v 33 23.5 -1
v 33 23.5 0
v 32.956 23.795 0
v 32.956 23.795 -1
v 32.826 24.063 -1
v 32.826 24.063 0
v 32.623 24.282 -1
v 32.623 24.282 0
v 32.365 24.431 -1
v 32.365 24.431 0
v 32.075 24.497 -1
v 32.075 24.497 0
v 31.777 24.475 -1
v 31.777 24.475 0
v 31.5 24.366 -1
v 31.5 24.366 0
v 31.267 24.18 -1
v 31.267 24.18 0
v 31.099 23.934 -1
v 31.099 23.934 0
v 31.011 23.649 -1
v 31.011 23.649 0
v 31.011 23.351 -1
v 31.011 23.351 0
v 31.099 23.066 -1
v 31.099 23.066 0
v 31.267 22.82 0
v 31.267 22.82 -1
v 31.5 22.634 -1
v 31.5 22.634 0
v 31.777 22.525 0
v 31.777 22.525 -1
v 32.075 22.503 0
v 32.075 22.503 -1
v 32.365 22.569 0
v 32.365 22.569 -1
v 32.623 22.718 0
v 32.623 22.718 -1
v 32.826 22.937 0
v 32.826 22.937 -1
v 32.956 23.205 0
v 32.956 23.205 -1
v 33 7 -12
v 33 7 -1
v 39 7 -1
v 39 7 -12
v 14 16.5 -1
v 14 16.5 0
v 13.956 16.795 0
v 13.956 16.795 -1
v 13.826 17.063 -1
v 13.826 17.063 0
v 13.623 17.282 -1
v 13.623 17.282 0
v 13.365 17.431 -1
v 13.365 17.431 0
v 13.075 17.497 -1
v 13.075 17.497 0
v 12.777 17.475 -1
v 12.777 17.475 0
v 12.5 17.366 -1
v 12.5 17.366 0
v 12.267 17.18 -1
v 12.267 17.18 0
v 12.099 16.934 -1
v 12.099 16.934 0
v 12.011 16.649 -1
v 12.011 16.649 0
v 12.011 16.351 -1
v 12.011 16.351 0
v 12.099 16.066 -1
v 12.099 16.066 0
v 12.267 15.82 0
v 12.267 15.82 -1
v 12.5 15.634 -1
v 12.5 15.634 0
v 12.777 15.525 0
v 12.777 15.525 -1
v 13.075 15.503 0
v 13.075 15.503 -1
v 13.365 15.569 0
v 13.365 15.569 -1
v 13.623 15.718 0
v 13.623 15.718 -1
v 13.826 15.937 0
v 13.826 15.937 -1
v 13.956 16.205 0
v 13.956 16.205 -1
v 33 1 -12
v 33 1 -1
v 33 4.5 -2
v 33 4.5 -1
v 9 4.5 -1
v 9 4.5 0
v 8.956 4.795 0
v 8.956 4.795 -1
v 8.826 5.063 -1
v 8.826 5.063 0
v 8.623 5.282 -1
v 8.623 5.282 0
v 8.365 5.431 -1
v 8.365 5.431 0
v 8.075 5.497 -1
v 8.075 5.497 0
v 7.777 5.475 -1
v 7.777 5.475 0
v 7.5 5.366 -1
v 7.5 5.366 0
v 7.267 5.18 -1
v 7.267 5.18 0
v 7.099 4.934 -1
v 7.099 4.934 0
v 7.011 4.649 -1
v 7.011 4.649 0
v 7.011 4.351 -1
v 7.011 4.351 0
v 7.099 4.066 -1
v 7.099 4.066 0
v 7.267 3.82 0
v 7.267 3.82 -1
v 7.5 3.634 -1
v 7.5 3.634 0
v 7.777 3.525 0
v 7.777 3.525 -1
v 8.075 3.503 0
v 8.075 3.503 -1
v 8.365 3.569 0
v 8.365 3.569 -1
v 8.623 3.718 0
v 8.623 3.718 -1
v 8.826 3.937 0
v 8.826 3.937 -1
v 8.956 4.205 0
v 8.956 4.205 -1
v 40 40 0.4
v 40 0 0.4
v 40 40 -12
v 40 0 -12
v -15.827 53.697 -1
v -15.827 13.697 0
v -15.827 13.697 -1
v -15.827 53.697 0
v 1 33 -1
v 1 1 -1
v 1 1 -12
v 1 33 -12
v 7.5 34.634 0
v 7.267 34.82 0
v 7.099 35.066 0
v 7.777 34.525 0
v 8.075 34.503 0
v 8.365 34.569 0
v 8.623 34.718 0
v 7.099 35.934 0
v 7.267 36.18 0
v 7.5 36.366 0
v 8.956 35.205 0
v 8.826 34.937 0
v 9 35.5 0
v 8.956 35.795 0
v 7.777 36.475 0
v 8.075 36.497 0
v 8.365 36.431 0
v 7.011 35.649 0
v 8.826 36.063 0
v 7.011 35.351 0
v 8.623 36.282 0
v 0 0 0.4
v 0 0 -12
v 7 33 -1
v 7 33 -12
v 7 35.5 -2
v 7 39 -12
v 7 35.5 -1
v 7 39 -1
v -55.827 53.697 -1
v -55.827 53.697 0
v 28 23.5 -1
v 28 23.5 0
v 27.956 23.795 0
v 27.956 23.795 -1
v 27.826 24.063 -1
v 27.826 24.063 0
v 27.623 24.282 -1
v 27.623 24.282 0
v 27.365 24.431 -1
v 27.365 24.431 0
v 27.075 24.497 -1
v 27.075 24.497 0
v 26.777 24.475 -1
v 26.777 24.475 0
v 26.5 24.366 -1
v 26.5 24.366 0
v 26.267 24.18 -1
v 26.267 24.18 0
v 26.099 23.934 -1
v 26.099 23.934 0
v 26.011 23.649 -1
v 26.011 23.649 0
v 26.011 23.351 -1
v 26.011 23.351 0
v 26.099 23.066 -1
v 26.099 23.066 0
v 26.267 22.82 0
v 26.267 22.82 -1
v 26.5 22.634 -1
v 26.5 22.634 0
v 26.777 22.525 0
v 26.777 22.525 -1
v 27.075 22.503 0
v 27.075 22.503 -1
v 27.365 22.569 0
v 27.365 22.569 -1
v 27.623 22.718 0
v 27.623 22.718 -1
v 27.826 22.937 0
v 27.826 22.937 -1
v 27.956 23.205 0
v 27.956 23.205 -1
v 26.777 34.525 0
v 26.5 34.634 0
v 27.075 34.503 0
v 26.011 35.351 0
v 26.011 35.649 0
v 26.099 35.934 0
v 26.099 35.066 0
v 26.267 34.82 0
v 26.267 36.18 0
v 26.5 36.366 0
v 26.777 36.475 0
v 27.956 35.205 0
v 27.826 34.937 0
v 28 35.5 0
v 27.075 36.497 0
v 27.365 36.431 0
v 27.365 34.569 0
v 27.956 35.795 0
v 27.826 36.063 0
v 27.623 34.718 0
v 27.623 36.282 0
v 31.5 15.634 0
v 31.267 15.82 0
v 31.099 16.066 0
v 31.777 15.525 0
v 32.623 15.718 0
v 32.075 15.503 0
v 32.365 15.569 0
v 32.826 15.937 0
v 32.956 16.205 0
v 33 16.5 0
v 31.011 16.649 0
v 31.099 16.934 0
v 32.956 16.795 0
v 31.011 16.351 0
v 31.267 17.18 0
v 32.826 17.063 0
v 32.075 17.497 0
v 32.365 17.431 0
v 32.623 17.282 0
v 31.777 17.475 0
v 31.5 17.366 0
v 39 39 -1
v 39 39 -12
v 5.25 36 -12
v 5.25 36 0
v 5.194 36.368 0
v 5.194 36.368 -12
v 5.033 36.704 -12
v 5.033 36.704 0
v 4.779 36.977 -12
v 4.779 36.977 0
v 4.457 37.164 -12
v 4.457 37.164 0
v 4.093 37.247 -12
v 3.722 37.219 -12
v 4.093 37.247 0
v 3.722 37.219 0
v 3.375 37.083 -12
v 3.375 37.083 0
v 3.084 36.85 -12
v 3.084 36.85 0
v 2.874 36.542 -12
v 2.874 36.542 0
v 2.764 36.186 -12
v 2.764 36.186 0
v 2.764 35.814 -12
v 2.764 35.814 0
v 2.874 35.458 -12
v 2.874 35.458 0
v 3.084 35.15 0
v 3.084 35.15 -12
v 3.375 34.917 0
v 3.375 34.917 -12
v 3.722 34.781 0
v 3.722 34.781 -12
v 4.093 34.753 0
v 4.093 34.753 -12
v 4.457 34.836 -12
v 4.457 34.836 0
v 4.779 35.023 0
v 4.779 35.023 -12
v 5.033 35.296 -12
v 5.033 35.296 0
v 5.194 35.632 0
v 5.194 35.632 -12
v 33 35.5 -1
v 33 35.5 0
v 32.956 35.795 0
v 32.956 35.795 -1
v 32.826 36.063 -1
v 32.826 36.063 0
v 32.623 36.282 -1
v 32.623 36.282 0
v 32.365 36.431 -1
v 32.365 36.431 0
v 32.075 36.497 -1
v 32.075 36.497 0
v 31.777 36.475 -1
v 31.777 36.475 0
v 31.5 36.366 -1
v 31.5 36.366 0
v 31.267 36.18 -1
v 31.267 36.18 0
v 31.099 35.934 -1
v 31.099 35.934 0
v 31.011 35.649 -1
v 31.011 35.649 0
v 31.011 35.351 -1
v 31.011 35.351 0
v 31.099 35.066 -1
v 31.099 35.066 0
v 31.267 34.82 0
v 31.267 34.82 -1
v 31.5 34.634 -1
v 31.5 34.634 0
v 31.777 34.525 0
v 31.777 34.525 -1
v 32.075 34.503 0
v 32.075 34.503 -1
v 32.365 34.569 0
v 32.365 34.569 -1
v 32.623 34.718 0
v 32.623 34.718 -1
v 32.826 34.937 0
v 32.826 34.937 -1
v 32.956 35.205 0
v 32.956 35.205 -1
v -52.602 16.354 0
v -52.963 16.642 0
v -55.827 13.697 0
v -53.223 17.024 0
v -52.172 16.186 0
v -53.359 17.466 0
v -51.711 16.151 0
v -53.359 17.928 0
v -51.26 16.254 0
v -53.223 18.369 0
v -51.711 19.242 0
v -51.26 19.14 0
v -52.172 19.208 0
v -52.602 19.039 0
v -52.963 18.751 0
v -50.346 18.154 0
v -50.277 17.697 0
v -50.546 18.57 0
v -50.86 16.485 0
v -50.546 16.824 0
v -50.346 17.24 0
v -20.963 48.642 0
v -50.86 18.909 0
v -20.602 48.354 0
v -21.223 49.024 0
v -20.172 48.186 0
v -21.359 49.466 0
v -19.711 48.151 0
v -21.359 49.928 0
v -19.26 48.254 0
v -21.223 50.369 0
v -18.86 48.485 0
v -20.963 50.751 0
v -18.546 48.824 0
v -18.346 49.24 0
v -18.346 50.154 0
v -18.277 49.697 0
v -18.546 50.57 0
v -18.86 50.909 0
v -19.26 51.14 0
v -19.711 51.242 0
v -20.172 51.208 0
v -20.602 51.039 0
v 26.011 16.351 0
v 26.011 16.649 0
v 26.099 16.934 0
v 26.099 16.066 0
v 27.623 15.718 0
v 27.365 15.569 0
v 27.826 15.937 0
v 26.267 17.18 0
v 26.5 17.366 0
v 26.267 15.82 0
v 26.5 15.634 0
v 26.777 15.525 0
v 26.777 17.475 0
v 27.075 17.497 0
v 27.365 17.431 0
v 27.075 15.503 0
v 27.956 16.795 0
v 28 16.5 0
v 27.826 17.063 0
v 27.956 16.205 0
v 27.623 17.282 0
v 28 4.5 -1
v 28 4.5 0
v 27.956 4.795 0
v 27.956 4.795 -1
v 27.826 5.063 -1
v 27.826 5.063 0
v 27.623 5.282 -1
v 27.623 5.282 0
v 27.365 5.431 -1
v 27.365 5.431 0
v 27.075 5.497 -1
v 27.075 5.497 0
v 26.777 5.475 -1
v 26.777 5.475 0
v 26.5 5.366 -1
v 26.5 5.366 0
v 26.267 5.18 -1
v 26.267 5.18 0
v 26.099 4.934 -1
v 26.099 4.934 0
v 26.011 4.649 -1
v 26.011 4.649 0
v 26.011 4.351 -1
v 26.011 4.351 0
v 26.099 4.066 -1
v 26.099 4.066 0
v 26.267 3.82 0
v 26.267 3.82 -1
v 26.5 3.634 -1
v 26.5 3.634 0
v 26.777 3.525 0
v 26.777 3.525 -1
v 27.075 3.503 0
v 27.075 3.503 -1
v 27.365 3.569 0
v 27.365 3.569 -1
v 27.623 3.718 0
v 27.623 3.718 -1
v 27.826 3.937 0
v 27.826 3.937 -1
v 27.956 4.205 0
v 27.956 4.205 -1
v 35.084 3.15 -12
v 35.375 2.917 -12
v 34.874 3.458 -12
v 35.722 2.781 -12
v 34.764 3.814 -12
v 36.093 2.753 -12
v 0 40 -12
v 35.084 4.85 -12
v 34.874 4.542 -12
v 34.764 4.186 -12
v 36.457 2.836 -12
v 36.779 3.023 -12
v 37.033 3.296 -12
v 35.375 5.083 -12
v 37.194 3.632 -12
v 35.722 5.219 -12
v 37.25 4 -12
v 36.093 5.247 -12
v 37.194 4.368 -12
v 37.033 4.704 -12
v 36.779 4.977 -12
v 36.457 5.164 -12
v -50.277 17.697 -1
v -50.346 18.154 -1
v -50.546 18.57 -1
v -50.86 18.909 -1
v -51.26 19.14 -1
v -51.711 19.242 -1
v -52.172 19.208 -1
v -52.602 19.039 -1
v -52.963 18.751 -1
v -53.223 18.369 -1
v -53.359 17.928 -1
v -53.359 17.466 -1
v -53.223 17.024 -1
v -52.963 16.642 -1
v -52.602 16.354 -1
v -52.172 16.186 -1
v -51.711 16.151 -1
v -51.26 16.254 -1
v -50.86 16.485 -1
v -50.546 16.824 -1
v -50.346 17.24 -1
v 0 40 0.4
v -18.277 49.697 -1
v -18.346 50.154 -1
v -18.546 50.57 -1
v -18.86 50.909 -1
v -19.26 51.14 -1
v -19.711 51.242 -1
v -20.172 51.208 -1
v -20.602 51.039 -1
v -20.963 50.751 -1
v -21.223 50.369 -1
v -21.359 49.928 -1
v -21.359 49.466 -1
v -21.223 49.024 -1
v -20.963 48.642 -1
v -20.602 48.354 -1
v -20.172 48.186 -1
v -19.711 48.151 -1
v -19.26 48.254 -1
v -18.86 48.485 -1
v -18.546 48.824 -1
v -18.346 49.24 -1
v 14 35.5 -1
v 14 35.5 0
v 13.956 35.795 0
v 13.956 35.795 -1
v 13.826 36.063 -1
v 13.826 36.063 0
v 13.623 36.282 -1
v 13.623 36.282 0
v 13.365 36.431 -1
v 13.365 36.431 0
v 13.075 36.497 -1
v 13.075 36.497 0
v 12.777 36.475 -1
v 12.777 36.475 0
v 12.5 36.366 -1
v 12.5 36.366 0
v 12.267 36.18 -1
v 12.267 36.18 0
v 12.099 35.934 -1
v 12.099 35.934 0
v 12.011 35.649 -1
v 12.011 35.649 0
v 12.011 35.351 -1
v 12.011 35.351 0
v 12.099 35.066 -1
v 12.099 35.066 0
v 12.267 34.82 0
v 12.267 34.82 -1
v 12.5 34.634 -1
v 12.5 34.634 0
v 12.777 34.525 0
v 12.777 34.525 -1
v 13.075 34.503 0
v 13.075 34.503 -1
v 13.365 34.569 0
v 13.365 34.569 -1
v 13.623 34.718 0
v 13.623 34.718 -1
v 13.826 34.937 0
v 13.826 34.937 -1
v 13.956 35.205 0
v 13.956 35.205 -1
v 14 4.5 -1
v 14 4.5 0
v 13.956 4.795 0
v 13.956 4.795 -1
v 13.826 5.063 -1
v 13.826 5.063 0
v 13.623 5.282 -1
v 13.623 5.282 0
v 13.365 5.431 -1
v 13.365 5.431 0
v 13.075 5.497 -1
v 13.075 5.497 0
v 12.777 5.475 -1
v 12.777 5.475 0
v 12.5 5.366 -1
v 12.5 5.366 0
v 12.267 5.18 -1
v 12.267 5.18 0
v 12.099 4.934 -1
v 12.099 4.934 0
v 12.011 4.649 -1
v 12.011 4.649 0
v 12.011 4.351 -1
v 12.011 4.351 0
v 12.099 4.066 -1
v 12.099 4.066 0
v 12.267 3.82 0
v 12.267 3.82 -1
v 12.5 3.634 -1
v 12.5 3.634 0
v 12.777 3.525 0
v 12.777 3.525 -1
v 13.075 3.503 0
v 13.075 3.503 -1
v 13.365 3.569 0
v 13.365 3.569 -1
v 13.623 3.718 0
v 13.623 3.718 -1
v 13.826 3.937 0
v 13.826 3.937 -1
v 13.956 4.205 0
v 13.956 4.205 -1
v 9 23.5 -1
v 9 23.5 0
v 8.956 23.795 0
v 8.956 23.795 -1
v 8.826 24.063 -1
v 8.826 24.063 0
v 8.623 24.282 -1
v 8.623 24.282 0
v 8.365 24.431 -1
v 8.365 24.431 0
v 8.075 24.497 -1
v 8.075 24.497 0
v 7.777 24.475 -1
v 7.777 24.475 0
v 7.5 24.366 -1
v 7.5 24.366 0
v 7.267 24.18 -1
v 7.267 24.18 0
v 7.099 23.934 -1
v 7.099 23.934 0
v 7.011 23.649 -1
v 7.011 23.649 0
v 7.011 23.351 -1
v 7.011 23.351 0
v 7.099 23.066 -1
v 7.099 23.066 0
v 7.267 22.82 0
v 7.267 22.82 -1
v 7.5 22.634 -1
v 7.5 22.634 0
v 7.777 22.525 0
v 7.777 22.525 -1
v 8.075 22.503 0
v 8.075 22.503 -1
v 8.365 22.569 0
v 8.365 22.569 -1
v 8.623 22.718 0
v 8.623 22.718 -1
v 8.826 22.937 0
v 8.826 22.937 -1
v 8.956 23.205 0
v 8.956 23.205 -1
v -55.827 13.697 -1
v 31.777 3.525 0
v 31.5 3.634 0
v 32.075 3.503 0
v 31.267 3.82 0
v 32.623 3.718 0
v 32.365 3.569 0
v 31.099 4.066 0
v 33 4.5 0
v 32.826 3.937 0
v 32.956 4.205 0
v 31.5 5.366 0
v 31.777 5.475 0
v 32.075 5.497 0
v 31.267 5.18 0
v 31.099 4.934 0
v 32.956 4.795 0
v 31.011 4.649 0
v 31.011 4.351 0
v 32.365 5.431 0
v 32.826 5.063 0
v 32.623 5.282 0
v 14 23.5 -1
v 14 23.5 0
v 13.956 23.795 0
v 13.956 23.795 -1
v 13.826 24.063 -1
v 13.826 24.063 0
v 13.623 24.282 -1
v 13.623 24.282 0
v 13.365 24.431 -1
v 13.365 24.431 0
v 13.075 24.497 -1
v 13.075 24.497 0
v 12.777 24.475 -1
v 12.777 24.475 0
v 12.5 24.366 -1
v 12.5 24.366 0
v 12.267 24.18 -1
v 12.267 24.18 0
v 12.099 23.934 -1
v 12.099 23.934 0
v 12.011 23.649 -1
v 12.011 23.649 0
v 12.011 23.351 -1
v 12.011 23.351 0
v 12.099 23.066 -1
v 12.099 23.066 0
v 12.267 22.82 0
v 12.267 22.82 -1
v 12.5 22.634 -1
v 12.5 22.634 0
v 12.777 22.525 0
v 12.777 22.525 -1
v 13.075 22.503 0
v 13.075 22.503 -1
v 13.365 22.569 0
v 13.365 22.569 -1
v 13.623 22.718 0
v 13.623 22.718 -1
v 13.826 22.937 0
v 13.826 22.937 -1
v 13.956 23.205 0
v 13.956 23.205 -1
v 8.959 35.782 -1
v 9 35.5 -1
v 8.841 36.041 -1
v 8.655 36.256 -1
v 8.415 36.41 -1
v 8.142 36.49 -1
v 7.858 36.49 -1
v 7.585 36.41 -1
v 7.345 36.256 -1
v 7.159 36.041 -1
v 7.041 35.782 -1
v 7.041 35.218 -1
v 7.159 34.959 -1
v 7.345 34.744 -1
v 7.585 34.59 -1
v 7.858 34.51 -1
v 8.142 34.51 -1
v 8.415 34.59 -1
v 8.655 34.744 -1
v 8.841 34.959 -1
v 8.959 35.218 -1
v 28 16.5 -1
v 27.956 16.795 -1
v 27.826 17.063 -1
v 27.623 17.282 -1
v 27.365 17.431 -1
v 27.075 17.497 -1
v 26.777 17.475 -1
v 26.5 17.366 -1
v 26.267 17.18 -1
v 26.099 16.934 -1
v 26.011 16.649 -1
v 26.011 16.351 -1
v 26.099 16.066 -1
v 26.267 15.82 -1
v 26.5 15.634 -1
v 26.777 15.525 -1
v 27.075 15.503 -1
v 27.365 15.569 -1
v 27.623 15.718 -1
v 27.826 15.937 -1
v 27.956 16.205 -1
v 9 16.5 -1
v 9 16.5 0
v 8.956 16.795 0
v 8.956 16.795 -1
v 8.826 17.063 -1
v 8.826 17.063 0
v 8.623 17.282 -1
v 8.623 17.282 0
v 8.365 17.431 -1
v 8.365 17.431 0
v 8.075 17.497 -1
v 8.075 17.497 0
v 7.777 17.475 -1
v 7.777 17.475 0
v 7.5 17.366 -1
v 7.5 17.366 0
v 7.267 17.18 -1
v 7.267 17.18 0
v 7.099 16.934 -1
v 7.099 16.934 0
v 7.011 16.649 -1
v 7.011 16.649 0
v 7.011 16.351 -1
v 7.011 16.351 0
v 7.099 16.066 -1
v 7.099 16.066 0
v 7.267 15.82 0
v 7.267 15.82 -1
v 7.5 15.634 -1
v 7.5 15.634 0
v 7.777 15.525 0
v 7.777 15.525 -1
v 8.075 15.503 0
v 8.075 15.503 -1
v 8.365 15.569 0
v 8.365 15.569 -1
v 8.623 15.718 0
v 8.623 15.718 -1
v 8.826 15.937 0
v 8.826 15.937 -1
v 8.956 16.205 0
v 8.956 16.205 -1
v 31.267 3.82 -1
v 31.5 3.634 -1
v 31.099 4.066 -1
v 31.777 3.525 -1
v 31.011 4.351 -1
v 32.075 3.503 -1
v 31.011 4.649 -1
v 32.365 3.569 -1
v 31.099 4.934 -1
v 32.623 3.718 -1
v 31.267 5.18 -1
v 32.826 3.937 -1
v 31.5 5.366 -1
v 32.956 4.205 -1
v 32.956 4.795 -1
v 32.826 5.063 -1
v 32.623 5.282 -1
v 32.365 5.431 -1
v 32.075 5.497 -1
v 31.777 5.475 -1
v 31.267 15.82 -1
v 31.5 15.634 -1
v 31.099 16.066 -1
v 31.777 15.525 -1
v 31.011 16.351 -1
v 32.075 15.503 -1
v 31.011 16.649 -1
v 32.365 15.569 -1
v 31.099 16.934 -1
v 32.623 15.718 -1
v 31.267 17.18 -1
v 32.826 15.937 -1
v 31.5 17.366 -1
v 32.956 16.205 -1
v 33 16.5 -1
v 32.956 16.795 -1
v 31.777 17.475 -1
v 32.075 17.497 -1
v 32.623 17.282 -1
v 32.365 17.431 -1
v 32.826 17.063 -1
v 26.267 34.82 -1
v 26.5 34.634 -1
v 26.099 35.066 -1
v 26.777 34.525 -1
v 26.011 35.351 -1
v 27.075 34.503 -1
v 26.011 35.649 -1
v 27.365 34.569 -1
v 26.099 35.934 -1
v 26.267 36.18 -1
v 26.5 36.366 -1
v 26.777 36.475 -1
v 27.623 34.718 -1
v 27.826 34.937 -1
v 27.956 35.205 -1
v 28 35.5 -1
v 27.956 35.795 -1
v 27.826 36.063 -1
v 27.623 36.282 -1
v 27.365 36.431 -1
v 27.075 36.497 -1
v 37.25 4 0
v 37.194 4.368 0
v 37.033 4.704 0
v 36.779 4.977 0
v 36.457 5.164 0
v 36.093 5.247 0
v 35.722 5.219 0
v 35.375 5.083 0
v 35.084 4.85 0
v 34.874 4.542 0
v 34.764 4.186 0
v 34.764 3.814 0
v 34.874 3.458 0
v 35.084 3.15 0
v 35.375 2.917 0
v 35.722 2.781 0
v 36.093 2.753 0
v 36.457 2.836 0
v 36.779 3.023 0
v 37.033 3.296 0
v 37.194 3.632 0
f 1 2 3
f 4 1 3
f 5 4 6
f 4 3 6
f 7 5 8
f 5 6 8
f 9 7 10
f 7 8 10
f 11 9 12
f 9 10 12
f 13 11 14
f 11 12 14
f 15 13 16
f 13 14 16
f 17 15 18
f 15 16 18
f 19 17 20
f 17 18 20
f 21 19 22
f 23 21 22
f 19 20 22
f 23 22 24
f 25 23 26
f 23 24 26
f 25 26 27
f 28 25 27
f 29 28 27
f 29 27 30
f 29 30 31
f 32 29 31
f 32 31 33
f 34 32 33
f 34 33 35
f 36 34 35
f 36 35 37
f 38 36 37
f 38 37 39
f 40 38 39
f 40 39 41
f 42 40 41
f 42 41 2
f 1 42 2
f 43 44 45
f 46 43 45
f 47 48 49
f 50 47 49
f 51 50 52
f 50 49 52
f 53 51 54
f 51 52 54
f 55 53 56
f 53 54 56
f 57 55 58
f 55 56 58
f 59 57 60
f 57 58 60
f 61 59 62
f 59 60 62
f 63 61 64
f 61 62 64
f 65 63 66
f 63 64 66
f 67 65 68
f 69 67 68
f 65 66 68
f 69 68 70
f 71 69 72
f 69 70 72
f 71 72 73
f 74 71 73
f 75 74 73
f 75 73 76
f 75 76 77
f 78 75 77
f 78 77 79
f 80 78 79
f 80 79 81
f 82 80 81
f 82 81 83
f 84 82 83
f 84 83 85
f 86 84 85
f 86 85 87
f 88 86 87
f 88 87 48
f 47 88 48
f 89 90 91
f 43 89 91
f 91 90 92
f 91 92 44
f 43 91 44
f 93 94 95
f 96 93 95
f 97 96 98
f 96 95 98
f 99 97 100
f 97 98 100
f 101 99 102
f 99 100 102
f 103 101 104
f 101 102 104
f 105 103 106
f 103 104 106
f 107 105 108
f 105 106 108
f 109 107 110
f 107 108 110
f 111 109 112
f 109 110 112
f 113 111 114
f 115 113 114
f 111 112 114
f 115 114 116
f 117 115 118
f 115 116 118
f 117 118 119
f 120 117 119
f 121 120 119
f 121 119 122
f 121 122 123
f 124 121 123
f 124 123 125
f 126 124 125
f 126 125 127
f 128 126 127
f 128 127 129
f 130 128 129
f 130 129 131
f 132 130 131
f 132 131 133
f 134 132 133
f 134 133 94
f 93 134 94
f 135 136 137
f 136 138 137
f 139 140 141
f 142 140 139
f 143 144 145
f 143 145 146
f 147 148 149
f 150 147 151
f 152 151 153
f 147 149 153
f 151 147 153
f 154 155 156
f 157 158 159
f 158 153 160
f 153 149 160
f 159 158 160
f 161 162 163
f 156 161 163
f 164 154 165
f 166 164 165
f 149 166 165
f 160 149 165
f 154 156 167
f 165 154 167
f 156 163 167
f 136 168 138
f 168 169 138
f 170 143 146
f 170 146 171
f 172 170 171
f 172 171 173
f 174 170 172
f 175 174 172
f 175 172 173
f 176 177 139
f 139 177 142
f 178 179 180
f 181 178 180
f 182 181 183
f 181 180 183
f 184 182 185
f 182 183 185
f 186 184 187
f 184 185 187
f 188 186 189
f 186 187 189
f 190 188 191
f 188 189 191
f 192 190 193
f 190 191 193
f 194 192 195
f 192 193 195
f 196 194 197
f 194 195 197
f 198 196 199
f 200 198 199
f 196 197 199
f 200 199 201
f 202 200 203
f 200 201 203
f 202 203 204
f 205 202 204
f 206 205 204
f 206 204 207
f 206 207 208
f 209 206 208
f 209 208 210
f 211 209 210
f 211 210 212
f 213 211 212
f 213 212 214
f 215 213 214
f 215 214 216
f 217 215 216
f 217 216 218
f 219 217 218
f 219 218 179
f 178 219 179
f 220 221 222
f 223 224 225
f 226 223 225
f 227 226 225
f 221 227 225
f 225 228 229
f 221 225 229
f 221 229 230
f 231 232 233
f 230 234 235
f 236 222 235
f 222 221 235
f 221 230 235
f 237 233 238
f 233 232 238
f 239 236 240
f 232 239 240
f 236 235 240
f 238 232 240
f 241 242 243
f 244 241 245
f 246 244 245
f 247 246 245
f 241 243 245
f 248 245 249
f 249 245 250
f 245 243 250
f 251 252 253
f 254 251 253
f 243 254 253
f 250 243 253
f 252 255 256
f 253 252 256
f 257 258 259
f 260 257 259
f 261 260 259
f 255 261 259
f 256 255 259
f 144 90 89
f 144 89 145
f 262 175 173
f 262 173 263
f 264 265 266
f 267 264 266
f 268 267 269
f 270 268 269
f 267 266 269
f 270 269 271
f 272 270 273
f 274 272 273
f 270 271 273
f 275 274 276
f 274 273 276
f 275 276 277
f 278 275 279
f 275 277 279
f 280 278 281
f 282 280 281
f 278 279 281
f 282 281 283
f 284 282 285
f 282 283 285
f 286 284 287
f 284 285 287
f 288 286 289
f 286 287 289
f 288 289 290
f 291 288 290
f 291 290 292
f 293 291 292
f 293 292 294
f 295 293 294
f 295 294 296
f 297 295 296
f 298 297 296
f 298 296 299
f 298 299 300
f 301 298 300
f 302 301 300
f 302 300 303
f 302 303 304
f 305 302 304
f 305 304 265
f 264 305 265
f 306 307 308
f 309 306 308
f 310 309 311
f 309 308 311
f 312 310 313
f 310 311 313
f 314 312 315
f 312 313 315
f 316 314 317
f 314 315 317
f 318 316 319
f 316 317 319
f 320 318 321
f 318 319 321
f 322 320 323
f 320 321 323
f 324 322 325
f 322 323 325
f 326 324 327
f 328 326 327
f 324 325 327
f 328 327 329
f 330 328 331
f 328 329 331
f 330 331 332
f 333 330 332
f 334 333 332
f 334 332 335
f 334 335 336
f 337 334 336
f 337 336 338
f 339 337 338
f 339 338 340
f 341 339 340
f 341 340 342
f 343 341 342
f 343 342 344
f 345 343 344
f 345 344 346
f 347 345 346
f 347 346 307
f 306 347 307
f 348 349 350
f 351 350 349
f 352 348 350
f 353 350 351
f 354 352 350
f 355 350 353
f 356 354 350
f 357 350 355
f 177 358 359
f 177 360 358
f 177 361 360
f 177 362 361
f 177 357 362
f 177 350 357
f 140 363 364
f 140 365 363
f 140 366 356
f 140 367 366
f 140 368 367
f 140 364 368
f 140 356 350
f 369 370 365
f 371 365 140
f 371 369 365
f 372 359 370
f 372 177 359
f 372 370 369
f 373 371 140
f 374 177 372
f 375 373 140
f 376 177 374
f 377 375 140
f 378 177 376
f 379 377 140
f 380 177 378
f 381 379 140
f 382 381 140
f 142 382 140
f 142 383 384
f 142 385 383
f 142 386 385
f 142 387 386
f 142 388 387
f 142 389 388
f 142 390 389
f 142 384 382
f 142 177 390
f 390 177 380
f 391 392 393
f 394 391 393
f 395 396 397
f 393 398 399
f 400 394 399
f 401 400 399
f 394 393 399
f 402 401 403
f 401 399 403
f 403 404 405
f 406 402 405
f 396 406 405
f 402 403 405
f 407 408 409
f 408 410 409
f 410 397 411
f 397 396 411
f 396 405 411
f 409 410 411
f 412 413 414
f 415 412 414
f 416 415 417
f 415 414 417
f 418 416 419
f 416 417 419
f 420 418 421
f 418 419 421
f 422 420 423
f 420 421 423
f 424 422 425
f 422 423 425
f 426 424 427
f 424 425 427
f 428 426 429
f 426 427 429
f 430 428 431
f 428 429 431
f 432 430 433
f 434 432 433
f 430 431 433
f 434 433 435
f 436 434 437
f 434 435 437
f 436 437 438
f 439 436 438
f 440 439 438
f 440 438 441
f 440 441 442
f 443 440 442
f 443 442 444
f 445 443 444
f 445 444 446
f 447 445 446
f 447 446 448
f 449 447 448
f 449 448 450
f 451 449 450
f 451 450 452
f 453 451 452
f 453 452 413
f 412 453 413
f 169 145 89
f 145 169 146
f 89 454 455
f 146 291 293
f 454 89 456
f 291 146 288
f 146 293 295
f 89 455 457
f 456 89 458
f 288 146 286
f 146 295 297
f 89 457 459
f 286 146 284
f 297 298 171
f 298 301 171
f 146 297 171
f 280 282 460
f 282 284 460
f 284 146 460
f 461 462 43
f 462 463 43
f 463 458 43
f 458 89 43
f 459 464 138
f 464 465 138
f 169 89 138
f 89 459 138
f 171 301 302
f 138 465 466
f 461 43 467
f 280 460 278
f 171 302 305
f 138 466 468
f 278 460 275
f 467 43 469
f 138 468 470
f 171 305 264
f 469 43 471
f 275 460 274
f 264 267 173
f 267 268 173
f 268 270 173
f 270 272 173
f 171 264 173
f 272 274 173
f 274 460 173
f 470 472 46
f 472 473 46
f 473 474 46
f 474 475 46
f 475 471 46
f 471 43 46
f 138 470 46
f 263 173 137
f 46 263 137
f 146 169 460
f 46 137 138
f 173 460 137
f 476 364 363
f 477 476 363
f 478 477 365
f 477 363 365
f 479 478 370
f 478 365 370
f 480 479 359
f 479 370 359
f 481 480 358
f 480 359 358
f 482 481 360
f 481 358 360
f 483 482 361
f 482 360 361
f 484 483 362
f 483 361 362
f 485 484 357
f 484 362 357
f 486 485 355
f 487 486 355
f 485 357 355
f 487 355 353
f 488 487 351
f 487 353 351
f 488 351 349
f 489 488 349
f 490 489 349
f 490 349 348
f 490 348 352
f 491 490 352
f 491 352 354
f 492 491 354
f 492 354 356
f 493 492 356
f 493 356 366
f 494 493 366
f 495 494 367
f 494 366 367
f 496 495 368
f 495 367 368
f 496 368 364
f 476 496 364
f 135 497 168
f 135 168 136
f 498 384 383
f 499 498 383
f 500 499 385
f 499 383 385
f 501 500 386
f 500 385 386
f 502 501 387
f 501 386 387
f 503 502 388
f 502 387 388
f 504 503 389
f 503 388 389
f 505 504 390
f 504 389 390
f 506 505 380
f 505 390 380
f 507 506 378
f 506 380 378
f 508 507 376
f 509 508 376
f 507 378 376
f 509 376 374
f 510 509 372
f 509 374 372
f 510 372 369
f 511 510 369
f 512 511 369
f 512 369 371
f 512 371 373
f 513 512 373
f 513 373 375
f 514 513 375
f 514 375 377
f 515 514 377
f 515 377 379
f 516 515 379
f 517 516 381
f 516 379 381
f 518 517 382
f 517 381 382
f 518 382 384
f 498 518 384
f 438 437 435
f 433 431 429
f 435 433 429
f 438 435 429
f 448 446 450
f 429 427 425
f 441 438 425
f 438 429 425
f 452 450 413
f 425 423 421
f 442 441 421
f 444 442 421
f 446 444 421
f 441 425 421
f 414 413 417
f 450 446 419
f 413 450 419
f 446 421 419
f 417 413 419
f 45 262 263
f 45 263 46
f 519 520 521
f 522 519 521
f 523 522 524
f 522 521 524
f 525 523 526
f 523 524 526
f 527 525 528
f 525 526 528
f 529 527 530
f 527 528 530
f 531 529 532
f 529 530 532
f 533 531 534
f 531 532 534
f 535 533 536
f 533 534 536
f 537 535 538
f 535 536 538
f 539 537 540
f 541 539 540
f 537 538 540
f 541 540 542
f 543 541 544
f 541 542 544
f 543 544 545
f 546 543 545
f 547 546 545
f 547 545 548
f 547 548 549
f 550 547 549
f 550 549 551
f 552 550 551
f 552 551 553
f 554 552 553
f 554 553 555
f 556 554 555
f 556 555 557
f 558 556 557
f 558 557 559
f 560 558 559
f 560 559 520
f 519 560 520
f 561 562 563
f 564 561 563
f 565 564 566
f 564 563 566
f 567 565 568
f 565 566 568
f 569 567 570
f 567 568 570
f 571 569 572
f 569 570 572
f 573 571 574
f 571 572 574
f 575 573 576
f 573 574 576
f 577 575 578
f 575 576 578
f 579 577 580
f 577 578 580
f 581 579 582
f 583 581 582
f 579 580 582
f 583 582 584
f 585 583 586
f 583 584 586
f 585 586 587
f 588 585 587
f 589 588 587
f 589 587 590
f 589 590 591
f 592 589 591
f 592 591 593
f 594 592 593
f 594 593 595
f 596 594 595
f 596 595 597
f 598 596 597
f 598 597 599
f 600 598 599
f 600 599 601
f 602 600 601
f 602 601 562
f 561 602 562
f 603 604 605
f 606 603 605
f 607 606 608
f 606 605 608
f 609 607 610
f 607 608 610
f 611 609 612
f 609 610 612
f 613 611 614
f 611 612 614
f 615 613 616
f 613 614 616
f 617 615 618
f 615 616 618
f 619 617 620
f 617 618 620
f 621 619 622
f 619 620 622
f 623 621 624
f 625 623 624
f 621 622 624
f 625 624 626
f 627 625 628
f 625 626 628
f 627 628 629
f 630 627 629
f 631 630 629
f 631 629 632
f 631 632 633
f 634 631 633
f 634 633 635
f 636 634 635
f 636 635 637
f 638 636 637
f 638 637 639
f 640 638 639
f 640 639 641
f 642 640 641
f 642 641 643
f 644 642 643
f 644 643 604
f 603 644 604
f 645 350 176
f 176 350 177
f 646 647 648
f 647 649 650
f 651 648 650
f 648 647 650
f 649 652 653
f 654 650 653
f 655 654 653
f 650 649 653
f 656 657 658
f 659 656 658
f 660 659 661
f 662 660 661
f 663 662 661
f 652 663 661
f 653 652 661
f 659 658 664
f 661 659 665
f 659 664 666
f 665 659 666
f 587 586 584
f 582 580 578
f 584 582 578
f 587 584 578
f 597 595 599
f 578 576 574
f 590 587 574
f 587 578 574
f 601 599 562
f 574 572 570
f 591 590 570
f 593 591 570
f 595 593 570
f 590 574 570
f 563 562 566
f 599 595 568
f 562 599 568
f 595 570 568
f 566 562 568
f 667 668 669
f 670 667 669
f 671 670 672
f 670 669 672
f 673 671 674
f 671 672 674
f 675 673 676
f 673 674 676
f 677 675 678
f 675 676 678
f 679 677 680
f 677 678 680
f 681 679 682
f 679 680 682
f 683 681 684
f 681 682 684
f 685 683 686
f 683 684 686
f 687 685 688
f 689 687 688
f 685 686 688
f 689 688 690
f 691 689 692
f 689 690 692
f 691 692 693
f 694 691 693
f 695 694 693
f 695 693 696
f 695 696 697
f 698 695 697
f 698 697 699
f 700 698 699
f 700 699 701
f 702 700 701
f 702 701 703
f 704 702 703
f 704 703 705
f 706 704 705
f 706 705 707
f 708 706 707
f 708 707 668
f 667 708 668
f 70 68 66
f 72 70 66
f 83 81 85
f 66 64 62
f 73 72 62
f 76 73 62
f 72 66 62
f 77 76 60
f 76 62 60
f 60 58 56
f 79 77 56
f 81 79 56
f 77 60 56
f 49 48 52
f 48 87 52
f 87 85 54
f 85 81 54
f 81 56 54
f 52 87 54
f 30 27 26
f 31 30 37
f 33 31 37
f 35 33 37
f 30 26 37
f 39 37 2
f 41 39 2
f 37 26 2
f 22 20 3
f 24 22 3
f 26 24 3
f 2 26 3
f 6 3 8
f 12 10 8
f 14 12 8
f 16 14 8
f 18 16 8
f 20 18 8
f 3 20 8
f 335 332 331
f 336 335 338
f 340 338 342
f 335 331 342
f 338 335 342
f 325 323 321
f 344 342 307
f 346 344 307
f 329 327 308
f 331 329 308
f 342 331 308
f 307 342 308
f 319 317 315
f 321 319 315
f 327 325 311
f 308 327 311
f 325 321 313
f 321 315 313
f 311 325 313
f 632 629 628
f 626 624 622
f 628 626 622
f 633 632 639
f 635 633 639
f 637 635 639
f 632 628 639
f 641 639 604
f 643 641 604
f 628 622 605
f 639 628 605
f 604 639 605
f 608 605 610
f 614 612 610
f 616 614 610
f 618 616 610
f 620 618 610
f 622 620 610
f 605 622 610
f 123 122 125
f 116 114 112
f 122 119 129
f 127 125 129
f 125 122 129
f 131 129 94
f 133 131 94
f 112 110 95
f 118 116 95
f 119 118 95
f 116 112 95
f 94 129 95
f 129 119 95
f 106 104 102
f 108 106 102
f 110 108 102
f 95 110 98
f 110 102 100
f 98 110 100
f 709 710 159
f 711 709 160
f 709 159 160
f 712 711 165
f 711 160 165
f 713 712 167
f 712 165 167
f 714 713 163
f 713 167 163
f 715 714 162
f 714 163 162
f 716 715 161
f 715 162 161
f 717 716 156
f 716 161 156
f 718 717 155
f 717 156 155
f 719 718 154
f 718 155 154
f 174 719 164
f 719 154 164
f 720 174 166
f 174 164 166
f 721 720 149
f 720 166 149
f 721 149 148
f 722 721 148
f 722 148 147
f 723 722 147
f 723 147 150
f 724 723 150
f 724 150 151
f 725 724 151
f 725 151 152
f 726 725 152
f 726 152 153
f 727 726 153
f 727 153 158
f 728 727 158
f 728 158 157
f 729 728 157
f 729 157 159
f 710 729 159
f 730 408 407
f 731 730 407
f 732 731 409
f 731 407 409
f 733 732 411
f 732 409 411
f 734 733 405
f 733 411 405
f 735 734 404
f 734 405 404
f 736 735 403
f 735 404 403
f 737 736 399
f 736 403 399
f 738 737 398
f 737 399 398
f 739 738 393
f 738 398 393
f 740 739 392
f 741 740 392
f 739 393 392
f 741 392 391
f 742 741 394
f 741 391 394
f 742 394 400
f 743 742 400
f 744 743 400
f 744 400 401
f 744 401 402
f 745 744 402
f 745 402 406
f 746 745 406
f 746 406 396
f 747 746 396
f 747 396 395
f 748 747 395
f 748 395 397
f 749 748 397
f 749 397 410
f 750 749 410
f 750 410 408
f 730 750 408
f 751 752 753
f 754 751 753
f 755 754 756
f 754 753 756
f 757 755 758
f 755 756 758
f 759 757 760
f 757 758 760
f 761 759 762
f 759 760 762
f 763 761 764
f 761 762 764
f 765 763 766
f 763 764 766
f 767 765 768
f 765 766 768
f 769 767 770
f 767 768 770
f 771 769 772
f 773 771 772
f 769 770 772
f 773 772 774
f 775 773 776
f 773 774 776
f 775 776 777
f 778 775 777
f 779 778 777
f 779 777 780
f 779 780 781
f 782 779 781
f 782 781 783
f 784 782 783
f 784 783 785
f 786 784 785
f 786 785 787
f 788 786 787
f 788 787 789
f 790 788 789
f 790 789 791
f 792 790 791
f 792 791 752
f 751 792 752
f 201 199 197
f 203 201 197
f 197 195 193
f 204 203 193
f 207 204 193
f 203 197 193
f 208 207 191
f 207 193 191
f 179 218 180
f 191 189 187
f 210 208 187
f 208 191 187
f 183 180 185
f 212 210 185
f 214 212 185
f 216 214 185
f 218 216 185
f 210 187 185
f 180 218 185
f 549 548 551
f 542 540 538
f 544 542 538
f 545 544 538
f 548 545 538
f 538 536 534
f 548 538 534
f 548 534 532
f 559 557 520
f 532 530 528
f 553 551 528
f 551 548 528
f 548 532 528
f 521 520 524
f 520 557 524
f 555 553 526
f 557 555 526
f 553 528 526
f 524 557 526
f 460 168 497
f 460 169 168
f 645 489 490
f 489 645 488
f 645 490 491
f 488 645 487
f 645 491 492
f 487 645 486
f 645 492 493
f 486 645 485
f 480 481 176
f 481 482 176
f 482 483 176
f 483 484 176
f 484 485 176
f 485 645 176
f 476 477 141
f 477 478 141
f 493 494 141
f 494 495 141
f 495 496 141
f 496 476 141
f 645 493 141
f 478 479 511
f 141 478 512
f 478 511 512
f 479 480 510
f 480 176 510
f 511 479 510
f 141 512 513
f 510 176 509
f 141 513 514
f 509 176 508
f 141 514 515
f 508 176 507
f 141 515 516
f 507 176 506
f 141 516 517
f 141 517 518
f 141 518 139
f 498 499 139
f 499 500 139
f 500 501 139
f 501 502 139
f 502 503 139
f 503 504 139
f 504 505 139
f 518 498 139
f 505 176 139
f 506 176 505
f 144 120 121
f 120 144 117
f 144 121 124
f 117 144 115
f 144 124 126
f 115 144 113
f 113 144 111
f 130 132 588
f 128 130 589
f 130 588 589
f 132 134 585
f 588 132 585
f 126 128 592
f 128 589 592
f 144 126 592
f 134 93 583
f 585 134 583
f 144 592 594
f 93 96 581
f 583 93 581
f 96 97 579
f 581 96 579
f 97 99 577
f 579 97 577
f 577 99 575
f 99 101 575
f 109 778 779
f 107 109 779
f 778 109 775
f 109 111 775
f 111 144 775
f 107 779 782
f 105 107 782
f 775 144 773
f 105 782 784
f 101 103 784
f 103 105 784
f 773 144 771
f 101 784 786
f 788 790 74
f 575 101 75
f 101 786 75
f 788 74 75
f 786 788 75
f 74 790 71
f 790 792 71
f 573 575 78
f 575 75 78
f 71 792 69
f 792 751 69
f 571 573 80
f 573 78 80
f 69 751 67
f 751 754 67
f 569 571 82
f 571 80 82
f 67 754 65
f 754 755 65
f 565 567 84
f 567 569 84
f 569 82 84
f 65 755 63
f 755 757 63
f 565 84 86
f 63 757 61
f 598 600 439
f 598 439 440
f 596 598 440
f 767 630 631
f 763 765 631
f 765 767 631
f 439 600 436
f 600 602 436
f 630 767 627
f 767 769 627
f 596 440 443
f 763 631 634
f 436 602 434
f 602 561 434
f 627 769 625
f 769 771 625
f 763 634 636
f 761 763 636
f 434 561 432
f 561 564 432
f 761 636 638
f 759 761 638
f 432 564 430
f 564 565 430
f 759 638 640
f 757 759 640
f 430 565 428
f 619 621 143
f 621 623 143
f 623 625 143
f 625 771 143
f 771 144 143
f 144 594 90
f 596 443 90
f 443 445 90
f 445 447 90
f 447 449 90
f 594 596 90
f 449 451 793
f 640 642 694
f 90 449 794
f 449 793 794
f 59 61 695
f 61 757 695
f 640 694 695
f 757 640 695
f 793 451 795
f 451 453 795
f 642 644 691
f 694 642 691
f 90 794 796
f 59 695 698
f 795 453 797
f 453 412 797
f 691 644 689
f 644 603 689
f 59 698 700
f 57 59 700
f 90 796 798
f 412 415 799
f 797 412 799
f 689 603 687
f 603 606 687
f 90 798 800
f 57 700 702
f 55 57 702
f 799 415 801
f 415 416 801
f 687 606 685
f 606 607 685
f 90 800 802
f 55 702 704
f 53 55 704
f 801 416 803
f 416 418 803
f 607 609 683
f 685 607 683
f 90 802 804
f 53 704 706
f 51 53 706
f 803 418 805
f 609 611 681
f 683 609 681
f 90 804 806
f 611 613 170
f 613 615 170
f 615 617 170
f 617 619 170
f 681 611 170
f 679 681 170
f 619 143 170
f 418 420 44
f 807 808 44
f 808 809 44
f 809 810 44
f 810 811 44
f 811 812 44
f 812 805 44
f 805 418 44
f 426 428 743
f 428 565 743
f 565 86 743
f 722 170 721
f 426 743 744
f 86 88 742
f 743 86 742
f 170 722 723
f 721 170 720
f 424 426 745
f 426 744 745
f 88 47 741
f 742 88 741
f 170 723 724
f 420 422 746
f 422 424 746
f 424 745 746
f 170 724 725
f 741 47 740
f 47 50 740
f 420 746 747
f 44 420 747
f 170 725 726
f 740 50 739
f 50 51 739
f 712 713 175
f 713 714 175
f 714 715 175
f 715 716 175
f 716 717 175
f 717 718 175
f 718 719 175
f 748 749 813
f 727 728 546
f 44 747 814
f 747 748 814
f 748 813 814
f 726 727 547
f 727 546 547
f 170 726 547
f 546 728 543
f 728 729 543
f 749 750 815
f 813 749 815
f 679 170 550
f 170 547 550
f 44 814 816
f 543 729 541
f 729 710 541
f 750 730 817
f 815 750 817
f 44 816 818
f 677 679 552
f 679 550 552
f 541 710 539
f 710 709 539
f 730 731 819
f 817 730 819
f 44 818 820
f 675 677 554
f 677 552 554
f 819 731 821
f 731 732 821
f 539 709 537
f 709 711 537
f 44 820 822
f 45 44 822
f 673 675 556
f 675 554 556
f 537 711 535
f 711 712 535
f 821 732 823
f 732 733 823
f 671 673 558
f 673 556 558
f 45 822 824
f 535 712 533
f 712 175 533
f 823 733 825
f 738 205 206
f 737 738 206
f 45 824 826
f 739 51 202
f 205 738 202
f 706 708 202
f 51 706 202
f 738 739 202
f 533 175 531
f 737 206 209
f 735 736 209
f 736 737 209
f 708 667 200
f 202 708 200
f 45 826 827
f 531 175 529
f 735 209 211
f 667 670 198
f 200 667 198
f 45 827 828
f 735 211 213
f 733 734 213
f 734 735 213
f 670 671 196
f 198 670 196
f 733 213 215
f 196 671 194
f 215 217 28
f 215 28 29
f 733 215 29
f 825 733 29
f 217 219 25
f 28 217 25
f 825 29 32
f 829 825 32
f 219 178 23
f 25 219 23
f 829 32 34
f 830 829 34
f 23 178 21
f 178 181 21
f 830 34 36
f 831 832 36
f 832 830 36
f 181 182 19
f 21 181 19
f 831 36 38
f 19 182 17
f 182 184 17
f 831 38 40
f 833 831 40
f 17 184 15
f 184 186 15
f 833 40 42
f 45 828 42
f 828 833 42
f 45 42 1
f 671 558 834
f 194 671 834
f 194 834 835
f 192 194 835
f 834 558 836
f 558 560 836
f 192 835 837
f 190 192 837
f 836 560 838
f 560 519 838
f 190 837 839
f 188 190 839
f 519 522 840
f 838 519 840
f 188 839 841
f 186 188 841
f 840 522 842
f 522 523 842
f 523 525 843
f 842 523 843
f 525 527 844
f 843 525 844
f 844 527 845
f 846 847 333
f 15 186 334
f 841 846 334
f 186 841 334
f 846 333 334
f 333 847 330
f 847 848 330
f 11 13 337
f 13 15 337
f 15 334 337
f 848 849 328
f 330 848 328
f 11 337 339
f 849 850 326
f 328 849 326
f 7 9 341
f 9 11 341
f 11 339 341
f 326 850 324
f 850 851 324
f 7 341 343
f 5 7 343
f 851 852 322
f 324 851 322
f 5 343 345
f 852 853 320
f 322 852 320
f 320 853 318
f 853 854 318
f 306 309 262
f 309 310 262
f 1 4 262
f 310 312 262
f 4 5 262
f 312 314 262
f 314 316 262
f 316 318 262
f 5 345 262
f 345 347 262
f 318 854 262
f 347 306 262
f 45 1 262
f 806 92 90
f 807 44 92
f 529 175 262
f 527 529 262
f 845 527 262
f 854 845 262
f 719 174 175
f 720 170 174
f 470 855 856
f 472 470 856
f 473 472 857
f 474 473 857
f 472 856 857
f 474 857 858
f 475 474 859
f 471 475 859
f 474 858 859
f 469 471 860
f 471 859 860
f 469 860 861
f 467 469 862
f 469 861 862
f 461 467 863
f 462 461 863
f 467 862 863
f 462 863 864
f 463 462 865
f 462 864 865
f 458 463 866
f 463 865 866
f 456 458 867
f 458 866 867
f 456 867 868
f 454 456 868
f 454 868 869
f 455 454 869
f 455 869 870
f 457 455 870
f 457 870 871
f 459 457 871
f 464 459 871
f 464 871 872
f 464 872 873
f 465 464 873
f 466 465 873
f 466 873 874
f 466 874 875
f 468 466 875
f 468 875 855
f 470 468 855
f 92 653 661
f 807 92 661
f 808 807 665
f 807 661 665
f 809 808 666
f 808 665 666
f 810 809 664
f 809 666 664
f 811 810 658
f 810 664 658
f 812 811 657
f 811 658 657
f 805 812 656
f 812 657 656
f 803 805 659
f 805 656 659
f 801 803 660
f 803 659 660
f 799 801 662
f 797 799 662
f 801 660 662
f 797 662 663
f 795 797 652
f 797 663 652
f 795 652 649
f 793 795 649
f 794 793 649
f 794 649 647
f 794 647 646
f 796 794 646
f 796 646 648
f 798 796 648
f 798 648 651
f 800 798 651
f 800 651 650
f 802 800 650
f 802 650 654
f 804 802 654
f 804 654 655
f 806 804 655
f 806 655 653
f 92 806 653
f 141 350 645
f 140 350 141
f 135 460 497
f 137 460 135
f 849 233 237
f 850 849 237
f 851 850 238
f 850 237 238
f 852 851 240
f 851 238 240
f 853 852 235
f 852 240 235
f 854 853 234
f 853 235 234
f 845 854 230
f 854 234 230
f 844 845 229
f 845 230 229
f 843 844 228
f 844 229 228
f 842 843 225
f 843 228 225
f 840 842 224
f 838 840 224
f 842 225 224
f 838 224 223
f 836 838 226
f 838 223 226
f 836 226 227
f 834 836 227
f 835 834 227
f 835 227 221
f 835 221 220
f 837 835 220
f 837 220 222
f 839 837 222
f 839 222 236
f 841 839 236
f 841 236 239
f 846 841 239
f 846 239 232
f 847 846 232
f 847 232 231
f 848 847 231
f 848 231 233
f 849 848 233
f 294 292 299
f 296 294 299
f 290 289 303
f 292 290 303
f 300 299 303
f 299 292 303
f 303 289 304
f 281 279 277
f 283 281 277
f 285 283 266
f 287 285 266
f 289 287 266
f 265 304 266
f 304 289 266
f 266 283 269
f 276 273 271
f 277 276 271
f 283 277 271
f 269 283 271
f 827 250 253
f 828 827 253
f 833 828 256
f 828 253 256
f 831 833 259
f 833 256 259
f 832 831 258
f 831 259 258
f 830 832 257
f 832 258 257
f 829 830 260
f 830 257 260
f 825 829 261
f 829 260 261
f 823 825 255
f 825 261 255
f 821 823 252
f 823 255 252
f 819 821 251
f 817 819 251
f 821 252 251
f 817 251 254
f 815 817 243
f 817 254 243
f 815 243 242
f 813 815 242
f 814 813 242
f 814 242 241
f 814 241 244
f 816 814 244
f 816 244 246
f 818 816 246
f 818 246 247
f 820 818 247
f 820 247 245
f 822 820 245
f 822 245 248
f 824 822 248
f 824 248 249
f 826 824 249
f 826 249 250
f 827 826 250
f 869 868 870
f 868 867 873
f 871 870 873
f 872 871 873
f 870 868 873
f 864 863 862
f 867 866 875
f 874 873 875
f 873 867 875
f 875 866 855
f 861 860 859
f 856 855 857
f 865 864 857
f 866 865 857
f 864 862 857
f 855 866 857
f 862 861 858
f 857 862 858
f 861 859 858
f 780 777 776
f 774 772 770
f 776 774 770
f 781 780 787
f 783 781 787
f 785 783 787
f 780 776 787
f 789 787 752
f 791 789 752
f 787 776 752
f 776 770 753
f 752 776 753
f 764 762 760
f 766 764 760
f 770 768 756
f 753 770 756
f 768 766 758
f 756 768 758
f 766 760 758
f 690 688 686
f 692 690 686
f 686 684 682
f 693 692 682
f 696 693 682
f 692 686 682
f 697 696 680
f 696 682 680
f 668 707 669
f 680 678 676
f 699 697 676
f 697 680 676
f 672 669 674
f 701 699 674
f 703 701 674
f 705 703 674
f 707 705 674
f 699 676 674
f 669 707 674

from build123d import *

# Parameters (mm, degrees)
F0_W     = 40
F0_H     = 40
F0_W_2   = 6
F0_H_2   = 6
F2_DEPTH = 12
F3_DEPTH = 1
F1_R     = 1
F4_DEPTH = 2
F5_R     = 1.25
F6_DEPTH = 25
F7_DEPTH = 0.4
F8_W     = 40
F8_H     = 40
F8_R     = 1.55
F9_DEPTH = 1


with BuildPart() as f2:
    # F0 (on Top) → F2 (new body)
    with BuildSketch(Plane.XY):
        with Locations((20, 20)):
            Rectangle(F0_W, F0_H)
        Polygon((33, 1), (1, 1), (1, 33), (1, 39), (7, 39), (39, 39), (39, 7), (39, 1), align=None, mode=Mode.SUBTRACT)
        with Locations((36, 4)):
            Rectangle(F0_W_2, F0_H_2)
        with Locations((4, 36)):
            Rectangle(F0_W_2, F0_H_2)
    extrude(amount=-F2_DEPTH)

    # F0 (on Top) → F3 (join)
    with BuildSketch(Plane.XY):
        Polygon((1, 33), (1, 1), (33, 1), (33, 7), (39, 7), (39, 39), (7, 39), (7, 33), align=None)
    extrude(amount=-F3_DEPTH)

    # F1 (on Top) → F4 (cut)
    with BuildSketch(Plane.XY):
        with Locations((8, 16.5)):
            Circle(F1_R)
        with Locations((13, 16.5)):
            Circle(F1_R)
        with Locations((8, 4.5)):
            Circle(F1_R)
        with Locations((13, 4.5)):
            Circle(F1_R)
        with Locations((8, 35.5)):
            Circle(F1_R)
        with Locations((13, 35.5)):
            Circle(F1_R)
        with Locations((8, 23.5)):
            Circle(F1_R)
        with Locations((13, 23.5)):
            Circle(F1_R)
        with Locations((27, 35.5)):
            Circle(F1_R)
        with Locations((32, 35.5)):
            Circle(F1_R)
        with Locations((27, 23.5)):
            Circle(F1_R)
        with Locations((32, 23.5)):
            Circle(F1_R)
        with Locations((27, 16.5)):
            Circle(F1_R)
        with Locations((32, 16.5)):
            Circle(F1_R)
        with Locations((27, 4.5)):
            Circle(F1_R)
        with Locations((32, 4.5)):
            Circle(F1_R)
    extrude(amount=-F4_DEPTH, mode=Mode.SUBTRACT)

    # F5 (on face) → F6 (cut)
    with BuildSketch(Plane.XY):
        with Locations((36, 4)):
            Circle(F5_R)
        with Locations((4, 36)):
            Circle(F5_R)
    extrude(amount=-F6_DEPTH, mode=Mode.SUBTRACT)

    # F0 (on Top) → F7 (join)
    with BuildSketch(Plane.XY):
        with Locations((20, 20)):
            Rectangle(F0_W, F0_H)
        Polygon((33, 1), (1, 1), (1, 33), (1, 39), (7, 39), (39, 39), (39, 7), (39, 1), align=None, mode=Mode.SUBTRACT)
        Polygon((1, 33), (1, 1), (33, 1), (33, 7), (39, 7), (39, 39), (7, 39), (7, 33), align=None)
        with Locations((36, 4)):
            Rectangle(F0_W_2, F0_H_2)
        with Locations((4, 36)):
            Rectangle(F0_W_2, F0_H_2)
    extrude(amount=F7_DEPTH)


with BuildPart() as f9:
    # F8 (on Top) → F9 (new body)
    with BuildSketch(Plane.XY):
        with Locations((-35.826643, 33.696713)):
            Rectangle(F8_W, F8_H)
        with Locations((-51.826643, 17.696713)):
            Circle(F8_R, mode=Mode.SUBTRACT)
        with Locations((-19.826643, 49.696713)):
            Circle(F8_R, mode=Mode.SUBTRACT)
    extrude(amount=-F9_DEPTH)


solid = Compound([f2.part, f9.part])
